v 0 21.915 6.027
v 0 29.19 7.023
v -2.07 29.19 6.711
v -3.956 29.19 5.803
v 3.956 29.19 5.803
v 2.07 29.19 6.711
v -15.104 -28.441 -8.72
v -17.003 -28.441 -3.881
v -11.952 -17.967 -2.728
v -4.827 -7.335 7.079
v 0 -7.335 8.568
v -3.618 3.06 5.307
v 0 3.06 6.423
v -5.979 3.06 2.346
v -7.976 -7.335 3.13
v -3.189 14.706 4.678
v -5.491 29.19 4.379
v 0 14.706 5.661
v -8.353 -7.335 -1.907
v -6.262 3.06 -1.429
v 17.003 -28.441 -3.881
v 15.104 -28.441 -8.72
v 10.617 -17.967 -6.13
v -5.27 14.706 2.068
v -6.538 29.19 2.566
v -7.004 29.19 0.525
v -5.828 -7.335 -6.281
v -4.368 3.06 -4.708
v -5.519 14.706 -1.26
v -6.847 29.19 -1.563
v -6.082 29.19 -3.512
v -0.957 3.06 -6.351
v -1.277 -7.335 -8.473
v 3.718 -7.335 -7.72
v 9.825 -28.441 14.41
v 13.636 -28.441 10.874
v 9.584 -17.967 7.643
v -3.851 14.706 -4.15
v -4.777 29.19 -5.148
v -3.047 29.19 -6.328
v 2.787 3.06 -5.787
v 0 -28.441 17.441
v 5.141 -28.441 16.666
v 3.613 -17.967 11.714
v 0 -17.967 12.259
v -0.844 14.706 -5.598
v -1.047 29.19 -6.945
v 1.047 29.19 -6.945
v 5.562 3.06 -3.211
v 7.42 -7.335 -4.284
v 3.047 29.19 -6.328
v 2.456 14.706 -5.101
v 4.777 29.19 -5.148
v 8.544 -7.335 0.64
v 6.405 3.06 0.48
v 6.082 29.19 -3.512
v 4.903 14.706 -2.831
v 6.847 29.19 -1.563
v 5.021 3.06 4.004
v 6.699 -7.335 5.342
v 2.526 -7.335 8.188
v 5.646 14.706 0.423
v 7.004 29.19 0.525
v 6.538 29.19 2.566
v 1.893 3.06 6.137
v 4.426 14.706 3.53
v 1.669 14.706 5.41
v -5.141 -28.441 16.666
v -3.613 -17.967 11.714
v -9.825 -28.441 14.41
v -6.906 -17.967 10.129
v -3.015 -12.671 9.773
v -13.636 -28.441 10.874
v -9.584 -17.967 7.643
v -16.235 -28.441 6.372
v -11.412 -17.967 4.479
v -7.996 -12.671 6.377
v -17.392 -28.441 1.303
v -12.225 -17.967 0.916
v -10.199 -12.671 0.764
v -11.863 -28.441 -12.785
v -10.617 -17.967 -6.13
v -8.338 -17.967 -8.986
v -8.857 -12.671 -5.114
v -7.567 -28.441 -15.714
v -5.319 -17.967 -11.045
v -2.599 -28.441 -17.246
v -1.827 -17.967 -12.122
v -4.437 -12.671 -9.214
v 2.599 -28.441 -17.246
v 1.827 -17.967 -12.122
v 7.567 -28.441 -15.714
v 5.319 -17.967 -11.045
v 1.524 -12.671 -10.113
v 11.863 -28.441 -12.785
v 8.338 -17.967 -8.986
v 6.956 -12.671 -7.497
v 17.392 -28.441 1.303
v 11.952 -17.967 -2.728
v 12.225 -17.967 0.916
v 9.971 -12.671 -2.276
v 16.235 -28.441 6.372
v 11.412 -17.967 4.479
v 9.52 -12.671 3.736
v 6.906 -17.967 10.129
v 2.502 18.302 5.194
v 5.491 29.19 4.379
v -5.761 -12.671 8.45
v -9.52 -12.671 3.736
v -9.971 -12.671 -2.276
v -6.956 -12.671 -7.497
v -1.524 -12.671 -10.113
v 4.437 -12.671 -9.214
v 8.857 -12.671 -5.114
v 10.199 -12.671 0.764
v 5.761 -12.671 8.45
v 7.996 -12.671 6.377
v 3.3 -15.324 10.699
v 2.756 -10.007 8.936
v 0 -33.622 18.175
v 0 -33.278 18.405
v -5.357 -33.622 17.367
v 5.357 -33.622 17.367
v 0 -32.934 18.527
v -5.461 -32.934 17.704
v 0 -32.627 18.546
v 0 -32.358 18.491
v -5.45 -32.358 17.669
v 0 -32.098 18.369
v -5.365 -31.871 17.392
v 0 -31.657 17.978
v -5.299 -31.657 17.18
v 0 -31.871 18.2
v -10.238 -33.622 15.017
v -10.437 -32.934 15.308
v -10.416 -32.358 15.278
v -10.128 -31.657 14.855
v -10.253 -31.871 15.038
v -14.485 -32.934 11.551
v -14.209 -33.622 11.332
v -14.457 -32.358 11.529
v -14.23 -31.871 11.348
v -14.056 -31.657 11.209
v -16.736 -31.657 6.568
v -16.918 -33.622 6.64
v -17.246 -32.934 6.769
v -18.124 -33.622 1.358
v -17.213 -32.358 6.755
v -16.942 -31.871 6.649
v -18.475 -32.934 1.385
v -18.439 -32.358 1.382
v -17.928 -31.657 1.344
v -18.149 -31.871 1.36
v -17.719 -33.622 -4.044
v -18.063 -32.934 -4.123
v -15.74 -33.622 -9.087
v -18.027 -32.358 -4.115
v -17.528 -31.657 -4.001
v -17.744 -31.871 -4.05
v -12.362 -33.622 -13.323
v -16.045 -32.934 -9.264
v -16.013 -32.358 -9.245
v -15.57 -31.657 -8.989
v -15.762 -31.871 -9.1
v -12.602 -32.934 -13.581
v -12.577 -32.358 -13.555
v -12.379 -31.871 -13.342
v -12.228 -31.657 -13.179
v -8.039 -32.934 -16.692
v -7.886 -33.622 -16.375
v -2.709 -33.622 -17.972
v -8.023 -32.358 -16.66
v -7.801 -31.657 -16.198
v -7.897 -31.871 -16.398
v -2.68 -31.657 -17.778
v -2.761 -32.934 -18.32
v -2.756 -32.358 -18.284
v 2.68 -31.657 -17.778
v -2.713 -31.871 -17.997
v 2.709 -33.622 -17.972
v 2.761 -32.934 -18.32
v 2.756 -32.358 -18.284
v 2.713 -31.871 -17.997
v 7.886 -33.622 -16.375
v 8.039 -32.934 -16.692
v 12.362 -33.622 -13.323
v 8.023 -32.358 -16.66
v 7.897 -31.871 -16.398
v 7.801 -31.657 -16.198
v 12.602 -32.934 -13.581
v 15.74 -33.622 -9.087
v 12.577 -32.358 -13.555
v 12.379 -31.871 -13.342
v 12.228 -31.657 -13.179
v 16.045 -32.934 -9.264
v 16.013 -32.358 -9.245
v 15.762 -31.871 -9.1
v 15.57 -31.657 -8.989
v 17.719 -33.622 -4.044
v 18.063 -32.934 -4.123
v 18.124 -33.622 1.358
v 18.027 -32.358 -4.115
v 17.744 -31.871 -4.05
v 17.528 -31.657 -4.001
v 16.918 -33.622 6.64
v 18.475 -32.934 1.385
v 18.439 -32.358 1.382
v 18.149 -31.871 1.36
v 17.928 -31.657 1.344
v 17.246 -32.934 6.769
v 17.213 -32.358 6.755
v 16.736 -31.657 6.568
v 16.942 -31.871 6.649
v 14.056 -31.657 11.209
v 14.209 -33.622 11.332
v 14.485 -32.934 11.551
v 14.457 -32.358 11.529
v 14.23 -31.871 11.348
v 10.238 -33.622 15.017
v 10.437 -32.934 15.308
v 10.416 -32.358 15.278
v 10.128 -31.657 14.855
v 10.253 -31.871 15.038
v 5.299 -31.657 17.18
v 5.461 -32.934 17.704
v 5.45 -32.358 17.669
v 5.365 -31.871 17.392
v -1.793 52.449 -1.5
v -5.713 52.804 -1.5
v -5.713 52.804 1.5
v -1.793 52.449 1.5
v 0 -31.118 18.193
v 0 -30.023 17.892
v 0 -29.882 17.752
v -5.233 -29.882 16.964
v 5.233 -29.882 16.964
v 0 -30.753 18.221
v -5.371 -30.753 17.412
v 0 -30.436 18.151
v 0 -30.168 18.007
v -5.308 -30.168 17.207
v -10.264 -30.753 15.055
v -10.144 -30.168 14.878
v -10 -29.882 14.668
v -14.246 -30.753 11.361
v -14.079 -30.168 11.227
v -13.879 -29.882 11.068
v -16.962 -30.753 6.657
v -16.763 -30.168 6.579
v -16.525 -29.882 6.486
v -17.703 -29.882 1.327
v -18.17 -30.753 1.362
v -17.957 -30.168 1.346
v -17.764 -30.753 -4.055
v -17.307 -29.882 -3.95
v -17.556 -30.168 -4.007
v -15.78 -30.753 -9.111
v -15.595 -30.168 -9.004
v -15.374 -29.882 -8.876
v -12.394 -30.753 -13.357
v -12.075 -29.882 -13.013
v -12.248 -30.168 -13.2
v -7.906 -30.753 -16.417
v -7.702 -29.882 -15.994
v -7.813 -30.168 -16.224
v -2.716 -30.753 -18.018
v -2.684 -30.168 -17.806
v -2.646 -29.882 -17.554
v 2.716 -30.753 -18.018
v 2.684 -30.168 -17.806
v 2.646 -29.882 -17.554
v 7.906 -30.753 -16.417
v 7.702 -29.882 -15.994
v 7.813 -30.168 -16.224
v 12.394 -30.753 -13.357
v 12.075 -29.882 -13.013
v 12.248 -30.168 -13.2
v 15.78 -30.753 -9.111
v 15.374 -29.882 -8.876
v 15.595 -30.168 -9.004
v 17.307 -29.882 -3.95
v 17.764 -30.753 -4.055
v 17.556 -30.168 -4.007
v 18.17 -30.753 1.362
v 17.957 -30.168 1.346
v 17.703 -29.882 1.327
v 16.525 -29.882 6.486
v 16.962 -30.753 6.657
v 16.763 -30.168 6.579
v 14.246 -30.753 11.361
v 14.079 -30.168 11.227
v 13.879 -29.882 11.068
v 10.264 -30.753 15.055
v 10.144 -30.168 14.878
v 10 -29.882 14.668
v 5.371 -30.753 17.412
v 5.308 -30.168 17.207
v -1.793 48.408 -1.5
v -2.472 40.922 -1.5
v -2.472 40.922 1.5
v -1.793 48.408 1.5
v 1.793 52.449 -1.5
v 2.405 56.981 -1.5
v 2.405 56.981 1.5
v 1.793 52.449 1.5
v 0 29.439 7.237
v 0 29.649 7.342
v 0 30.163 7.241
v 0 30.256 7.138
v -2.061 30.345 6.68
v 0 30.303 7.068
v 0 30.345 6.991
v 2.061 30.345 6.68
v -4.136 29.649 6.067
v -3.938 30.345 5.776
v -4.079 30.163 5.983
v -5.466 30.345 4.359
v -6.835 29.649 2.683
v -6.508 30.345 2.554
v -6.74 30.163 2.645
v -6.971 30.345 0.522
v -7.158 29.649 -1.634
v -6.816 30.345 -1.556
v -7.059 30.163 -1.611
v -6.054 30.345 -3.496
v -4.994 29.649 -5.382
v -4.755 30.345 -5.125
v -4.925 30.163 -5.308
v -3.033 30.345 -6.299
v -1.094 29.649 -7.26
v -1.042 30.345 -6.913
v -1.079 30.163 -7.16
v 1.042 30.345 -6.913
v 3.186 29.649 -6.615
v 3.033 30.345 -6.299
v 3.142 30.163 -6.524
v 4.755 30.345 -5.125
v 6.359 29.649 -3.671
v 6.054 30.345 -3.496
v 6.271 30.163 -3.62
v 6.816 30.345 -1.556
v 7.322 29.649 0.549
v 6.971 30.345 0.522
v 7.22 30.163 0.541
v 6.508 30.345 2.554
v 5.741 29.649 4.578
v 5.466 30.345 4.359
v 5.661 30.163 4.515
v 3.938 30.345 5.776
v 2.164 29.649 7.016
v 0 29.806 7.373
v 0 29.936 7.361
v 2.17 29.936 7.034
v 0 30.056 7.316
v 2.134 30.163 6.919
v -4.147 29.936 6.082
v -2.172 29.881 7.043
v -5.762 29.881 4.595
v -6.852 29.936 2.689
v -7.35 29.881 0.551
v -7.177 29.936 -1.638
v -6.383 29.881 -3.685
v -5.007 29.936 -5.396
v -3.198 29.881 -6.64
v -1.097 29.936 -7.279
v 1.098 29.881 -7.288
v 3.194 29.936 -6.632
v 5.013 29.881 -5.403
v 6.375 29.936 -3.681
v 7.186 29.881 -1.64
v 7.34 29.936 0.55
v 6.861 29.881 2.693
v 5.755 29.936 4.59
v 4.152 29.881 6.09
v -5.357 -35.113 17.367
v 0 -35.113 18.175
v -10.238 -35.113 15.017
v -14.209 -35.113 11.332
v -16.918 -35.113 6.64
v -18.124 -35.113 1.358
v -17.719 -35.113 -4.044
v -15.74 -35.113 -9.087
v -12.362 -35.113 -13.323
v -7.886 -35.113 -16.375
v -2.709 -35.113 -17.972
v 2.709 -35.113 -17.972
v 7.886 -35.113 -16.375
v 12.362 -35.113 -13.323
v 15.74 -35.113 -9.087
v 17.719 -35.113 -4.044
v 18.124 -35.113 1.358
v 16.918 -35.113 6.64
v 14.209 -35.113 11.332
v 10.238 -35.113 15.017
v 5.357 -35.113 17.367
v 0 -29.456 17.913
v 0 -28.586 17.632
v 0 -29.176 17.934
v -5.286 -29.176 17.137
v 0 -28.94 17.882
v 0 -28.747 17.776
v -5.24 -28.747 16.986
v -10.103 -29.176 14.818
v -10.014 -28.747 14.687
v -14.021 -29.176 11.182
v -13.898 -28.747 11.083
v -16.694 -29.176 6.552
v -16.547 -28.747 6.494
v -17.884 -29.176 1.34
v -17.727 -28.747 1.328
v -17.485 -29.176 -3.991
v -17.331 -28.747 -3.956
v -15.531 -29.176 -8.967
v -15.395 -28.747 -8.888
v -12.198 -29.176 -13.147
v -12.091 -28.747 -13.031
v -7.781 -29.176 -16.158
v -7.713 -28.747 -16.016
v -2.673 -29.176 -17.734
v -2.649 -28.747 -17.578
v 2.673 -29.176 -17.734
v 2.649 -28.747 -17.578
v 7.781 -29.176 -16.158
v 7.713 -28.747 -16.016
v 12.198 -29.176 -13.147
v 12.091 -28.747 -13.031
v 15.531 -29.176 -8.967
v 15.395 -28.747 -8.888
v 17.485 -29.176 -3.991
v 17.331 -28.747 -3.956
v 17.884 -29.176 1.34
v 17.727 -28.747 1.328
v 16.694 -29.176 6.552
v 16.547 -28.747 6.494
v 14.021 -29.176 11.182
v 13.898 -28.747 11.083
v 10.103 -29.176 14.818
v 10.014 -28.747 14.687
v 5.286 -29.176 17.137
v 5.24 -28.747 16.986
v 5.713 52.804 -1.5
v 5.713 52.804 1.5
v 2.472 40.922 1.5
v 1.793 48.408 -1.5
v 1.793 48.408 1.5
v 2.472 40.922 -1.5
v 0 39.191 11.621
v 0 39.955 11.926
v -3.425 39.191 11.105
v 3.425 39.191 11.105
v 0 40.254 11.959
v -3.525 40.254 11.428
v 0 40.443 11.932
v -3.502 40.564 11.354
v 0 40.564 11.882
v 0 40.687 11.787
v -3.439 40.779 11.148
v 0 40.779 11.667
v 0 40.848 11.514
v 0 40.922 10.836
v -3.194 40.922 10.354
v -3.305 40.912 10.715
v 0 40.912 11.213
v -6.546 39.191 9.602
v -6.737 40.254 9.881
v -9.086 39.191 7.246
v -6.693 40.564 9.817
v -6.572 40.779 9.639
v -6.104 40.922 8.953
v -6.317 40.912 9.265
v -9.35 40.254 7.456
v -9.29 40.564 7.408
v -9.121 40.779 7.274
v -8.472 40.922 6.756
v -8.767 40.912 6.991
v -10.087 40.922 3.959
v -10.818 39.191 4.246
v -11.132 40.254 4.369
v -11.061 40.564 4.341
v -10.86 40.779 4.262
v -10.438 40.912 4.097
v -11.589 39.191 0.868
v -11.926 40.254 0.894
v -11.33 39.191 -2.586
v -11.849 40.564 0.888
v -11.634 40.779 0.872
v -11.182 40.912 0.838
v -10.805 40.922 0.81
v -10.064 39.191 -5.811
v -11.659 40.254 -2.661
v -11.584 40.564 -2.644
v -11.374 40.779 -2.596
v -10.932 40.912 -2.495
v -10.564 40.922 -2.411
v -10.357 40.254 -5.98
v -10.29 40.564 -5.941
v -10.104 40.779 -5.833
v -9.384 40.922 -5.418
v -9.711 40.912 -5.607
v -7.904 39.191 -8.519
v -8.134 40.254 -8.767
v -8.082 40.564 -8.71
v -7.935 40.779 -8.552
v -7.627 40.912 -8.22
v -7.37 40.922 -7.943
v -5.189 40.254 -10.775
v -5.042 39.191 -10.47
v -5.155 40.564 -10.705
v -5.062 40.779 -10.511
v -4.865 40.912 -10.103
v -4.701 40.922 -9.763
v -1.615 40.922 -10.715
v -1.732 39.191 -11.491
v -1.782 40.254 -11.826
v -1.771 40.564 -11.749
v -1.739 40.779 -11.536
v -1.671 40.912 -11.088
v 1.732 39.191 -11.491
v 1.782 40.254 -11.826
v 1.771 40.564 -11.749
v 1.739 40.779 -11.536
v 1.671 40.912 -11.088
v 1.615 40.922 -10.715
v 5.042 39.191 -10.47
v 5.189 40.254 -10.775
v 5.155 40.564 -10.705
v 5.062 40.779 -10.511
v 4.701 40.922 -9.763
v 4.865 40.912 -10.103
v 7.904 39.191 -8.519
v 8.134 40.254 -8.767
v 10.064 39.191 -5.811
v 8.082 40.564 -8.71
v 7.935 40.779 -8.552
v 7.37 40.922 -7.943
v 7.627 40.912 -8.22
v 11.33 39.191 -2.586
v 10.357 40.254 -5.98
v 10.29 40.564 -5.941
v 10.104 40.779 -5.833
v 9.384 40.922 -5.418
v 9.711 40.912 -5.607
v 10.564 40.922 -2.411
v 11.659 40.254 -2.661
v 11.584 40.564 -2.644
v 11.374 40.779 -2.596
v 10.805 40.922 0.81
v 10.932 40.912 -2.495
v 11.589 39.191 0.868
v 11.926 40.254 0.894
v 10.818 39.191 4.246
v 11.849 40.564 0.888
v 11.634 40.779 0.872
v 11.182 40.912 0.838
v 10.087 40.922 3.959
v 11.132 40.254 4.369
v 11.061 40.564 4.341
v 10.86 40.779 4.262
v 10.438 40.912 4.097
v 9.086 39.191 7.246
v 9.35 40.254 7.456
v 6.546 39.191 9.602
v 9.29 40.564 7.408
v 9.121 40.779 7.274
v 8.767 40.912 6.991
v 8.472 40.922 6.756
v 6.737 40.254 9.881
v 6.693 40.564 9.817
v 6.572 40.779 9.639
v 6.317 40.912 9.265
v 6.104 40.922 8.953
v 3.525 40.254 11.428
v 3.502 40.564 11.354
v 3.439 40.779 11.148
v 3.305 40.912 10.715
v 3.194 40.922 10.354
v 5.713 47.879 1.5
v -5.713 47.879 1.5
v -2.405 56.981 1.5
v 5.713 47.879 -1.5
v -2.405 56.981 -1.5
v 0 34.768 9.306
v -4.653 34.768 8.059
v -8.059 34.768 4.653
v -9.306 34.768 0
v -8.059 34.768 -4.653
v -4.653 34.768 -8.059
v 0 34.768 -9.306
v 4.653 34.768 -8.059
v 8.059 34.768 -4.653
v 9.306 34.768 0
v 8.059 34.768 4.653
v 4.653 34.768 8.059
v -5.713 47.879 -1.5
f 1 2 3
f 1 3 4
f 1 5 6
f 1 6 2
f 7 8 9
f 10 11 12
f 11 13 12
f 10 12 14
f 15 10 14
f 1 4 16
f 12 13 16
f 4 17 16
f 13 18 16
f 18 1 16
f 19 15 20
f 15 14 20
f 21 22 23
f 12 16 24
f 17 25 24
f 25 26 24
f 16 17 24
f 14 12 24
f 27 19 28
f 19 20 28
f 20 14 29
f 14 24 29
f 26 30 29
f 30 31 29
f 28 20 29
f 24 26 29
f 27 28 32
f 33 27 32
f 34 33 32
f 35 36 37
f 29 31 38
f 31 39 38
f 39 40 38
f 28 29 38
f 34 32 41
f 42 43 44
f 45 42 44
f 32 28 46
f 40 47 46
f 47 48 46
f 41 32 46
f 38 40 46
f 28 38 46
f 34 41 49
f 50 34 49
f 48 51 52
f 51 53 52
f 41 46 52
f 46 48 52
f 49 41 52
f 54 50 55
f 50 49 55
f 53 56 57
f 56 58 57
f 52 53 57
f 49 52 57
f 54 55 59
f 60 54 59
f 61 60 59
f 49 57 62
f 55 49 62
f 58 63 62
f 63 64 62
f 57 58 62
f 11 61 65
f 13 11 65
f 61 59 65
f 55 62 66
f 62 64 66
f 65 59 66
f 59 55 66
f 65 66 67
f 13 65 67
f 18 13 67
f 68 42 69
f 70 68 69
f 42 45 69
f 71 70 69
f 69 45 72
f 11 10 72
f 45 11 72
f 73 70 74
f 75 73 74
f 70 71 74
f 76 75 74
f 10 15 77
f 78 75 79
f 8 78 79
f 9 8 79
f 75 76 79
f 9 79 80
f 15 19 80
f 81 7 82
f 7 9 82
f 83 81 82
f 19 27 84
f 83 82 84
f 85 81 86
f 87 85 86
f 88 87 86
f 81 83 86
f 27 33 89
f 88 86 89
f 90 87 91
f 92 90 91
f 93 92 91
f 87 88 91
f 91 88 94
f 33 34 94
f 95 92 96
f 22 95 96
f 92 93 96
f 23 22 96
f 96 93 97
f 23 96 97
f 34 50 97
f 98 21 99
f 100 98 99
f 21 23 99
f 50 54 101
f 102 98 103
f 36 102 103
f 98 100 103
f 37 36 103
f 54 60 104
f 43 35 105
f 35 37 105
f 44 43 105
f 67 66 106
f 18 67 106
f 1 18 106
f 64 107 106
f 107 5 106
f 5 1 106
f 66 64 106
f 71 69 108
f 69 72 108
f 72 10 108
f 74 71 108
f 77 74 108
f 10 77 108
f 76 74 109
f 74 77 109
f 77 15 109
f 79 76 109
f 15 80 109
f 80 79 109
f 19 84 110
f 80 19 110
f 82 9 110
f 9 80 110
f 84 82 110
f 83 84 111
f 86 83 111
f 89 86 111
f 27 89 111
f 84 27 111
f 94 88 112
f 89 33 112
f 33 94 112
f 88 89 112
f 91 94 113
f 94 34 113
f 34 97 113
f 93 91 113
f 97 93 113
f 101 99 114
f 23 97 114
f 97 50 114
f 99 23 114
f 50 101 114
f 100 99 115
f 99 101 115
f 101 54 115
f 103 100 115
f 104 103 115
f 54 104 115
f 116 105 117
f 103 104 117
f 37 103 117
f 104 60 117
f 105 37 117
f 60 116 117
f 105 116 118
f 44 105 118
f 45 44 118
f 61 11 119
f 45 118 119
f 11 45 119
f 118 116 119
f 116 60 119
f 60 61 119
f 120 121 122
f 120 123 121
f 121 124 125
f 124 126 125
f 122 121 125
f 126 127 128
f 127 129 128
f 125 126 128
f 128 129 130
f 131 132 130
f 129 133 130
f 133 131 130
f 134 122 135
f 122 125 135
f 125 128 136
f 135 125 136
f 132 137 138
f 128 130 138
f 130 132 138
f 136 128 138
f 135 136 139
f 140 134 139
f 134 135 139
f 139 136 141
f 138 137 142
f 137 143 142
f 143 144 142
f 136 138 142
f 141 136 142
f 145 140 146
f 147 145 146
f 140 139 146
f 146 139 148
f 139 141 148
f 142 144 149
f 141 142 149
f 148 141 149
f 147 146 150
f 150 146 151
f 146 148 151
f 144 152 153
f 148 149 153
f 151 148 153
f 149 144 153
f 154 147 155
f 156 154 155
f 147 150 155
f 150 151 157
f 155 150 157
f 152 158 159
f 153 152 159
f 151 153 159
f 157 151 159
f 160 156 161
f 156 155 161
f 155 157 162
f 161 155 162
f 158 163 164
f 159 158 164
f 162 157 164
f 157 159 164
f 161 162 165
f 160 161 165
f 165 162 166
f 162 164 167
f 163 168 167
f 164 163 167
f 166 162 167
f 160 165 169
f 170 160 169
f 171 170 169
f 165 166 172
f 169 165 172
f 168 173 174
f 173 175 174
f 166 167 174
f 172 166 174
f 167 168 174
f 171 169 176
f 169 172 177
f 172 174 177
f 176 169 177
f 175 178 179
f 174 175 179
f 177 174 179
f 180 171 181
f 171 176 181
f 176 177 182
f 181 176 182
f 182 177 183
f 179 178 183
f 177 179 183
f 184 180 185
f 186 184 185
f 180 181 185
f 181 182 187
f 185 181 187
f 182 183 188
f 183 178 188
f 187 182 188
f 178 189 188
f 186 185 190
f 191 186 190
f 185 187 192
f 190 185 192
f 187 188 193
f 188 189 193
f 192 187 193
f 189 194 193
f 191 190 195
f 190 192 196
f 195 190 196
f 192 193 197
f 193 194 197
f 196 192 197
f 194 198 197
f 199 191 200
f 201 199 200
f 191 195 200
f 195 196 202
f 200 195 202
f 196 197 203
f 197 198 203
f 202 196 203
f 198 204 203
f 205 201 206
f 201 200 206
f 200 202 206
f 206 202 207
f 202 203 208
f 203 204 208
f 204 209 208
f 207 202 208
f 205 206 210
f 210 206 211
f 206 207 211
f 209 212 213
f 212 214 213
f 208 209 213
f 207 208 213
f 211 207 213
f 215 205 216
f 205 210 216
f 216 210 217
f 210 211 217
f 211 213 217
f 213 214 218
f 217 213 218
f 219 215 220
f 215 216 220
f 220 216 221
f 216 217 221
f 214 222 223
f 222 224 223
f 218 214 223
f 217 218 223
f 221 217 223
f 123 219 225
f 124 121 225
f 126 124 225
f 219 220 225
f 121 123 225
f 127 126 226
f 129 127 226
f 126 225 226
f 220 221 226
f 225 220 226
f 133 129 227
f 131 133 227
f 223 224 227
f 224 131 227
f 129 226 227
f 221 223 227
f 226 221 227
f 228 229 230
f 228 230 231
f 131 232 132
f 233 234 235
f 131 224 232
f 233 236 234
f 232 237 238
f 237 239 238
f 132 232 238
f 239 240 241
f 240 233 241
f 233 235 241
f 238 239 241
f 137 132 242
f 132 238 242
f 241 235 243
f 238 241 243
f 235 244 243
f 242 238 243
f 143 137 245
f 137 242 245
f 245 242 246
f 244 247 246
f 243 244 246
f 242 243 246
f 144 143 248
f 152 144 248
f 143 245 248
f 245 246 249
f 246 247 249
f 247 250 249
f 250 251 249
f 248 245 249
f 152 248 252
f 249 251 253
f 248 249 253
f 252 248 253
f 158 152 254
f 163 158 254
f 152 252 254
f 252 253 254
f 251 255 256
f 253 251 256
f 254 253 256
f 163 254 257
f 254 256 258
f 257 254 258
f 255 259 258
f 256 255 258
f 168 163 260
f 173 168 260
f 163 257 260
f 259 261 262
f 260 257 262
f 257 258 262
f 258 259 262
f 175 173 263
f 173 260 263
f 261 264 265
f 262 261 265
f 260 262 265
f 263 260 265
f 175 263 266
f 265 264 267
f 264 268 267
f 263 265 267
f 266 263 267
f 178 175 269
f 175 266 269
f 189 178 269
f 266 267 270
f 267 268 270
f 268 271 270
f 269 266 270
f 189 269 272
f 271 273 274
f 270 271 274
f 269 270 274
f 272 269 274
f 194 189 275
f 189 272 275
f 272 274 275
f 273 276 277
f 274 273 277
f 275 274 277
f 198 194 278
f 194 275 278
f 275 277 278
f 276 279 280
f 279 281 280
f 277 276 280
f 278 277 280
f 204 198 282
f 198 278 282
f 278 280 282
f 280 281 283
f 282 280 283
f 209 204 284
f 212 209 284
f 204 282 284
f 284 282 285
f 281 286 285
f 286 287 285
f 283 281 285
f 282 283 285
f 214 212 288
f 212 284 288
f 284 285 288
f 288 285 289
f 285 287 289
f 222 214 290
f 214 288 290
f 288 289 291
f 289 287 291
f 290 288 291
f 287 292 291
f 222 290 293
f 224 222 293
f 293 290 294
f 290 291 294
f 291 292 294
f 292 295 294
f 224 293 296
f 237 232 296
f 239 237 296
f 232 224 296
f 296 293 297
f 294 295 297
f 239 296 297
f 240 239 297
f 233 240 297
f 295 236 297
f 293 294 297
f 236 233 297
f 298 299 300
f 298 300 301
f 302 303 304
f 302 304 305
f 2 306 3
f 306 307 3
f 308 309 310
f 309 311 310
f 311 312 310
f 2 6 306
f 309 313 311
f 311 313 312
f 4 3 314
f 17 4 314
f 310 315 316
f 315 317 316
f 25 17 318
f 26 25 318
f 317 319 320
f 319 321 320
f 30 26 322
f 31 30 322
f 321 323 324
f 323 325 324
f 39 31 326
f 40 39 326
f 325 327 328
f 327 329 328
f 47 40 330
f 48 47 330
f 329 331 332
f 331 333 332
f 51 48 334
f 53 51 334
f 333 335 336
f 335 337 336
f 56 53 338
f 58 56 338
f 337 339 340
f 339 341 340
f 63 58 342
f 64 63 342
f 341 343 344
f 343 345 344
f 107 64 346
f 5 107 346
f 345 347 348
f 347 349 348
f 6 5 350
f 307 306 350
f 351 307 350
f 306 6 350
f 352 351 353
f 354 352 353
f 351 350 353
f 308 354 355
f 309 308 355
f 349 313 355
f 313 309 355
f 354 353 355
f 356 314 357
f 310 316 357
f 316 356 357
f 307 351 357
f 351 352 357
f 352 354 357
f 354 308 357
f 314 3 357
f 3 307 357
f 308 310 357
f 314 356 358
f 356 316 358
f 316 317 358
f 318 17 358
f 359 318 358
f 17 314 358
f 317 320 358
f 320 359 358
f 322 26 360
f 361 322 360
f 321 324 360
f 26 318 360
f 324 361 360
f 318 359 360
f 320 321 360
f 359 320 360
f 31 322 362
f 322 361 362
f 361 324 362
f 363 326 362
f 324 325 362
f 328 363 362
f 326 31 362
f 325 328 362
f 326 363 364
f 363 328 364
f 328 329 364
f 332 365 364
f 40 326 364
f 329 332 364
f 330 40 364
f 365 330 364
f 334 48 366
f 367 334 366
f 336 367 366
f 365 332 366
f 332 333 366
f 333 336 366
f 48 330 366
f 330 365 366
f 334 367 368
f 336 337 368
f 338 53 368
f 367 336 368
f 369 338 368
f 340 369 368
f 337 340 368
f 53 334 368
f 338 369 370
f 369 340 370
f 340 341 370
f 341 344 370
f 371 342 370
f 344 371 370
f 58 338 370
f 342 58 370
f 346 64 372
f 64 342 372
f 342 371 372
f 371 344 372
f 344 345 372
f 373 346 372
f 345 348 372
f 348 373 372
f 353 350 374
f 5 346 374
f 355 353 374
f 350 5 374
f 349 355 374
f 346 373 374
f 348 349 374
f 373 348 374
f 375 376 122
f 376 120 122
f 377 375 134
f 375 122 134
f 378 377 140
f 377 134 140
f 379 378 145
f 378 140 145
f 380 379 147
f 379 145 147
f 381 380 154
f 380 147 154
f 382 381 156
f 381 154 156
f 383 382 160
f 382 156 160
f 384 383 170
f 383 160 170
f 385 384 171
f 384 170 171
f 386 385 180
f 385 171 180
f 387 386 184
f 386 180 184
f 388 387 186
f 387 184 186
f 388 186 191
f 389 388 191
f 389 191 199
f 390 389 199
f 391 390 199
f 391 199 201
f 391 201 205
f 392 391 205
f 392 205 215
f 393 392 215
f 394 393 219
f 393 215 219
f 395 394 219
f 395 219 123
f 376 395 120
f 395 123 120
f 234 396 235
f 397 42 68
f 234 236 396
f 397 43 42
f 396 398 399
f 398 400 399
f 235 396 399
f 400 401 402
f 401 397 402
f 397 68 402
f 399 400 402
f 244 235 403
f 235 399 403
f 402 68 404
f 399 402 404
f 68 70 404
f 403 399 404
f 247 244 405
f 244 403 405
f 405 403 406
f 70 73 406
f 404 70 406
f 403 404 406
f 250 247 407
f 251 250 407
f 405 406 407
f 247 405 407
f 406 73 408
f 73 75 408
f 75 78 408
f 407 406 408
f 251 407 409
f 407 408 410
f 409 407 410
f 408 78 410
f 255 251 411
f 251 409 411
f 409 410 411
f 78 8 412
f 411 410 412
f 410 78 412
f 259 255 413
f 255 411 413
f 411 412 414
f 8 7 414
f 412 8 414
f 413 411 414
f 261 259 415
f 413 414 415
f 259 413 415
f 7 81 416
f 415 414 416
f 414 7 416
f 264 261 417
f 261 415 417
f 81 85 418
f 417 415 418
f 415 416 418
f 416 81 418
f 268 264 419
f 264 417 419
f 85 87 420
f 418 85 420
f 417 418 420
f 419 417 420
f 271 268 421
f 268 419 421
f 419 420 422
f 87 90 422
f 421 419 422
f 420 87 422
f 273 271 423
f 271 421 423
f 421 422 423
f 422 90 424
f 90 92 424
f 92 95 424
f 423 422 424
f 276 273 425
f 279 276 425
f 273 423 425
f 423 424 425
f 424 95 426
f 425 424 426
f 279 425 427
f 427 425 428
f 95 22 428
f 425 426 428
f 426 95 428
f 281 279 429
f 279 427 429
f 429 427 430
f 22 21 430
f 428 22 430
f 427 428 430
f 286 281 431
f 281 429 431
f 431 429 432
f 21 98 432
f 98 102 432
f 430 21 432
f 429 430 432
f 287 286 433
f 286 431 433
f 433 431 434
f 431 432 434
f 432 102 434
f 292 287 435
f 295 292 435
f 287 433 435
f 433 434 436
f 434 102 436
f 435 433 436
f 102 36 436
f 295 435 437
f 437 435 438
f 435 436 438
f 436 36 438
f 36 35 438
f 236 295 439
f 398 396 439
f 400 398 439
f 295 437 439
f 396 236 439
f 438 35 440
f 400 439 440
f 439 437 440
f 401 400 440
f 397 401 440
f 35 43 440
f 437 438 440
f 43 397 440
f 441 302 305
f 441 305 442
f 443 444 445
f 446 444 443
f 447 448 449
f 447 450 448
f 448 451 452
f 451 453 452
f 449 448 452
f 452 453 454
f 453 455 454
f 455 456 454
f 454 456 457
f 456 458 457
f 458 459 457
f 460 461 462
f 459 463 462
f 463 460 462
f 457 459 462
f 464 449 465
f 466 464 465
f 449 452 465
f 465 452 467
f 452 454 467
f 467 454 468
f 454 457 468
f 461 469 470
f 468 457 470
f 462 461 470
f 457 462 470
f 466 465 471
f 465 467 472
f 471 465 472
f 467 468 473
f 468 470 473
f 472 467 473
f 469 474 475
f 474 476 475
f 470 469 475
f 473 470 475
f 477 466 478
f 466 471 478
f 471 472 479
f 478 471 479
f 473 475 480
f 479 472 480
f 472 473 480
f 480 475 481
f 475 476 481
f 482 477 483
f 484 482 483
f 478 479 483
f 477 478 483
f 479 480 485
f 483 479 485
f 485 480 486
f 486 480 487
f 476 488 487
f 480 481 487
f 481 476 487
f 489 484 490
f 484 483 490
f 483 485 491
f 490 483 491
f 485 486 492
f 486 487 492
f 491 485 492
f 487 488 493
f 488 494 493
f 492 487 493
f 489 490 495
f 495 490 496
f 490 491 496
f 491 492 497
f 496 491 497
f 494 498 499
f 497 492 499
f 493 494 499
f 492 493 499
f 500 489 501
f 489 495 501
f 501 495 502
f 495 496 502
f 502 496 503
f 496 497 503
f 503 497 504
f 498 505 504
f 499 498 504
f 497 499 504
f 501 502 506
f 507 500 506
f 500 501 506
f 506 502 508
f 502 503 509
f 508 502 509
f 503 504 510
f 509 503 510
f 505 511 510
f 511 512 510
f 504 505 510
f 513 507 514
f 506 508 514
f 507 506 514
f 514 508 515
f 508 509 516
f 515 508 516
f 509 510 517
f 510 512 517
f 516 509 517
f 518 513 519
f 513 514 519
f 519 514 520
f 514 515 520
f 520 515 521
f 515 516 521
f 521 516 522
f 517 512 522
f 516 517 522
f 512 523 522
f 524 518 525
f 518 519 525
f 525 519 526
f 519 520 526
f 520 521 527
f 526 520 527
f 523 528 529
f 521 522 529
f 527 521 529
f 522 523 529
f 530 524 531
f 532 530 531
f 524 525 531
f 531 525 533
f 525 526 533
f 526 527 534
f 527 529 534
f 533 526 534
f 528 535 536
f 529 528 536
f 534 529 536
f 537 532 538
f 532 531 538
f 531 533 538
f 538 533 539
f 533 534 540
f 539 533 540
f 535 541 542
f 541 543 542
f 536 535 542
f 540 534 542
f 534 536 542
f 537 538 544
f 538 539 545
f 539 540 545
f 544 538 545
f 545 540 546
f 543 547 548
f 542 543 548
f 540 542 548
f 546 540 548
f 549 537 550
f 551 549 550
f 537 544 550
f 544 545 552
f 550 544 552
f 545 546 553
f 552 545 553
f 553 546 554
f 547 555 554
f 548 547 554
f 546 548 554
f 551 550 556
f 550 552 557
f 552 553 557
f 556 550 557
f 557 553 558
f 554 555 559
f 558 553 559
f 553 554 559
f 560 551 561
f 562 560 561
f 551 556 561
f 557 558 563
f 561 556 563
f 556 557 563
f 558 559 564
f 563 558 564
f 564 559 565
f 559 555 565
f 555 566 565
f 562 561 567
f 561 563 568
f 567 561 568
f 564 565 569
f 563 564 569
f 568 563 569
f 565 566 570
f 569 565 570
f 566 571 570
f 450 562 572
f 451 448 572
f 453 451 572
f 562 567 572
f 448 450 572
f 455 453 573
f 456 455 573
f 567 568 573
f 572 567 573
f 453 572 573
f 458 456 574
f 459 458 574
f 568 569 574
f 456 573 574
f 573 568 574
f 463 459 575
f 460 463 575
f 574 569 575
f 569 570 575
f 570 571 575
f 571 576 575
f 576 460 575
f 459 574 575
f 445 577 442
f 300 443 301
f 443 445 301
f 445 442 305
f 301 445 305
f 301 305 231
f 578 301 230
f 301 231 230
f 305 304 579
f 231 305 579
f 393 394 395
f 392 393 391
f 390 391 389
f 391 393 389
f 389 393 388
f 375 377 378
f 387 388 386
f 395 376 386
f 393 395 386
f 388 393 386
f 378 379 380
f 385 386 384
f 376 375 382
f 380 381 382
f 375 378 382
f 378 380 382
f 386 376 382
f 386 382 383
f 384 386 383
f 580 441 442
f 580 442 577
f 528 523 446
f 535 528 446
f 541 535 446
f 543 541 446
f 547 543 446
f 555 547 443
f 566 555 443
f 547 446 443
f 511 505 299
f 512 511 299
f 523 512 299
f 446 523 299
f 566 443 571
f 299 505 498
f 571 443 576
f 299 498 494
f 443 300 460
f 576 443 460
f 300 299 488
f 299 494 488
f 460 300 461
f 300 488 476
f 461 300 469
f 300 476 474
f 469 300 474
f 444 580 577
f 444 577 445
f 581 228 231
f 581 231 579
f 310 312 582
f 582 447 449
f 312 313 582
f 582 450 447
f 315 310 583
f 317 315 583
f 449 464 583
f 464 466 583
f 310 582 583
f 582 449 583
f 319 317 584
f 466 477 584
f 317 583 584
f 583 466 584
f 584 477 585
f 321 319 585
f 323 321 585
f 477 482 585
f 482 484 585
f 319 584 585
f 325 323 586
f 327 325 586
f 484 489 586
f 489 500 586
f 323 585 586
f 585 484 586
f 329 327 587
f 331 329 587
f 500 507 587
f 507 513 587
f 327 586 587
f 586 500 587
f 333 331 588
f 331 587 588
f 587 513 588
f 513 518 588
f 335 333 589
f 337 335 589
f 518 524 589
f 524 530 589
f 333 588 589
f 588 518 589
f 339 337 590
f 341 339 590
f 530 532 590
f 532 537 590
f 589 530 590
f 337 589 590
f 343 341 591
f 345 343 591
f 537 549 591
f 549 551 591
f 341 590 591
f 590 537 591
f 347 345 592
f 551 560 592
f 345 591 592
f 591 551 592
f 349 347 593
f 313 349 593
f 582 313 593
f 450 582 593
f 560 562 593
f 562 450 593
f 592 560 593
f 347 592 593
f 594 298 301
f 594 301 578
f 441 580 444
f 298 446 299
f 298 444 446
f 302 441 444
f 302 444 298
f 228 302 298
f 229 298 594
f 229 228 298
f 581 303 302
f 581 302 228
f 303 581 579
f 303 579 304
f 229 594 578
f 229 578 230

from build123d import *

# Parameters (mm, degrees)
BOSS_EXTRUDE1_DEPTH      = 1.5
BOSS_EXTRUDE1_DEPTH_BACK = 1.5


with BuildPart() as part:
    # Body → Revolve2 (revolve)
    with BuildSketch(Plane.XY):
        with BuildLine():
            Line((0, -35.112605452), (-18.174629027, -35.112605452))
            Line((-18.174629027, -35.112605452), (-18.174629027, -33.622393907))
            add(Edge.make_bspline(
                [(-18.174629027, -33.622393907), (-18.746777836, -32.93871692), (-18.649381124, -32.21761099), (-17.978486488, -31.656539775)],
                knots=[0, 0, 0, 0, 1, 1, 1, 1], degree=3))
            add(Edge.make_bspline(
                [(-17.978486488, -31.656539775), (-18.565257788, -30.617916679), (-17.752329486, -29.882490381)],
                knots=[0, 0, 0, 1, 1, 1], degree=2))
            add(Edge.make_bspline(
                [(-17.752329486, -29.882490381), (-18.238397249, -28.955270963), (-17.440670859, -28.44106923)],
                knots=[0, 0, 0, 1, 1, 1], degree=2))
            add(Edge.make_bspline(
                [(-17.440670859, -28.44106923), (-1.650744274, -0.748893793), (-7.023375291, 29.189979279)],
                knots=[0, 0, 0, 1, 1, 1], degree=2))
            add(Edge.make_bspline(
                [(-7.023375291, 29.189979279), (-7.559938915, 29.704191997), (-7.422823029, 30.133693737), (-6.991039479, 30.344569347)],
                knots=[0, 0, 0, 0, 1, 1, 1, 1], degree=3))
            Line((-6.991039479, 30.344569347), (-11.621054148, 39.190746791))
            add(Edge.make_bspline(
                [(-11.621054148, 39.190746791), (-12.576182421, 40.990355328), (-10.835631062, 40.921958778)],
                knots=[0, 0, 0, 1, 1, 1], degree=2))
            Line((-10.835631062, 40.921958778), (0, 40.921958778))
            Line((0, 40.921958778), (0, -35.112605452))
        make_face()
    revolve(axis=Axis((0, 55.231222452, 0), (0, -1, 0)))

    # Head → Boss-Extrude1 (add, two sides: drawn at the far end of the back side and taken through both)
    with BuildSketch(Plane.XY.offset(-BOSS_EXTRUDE1_DEPTH_BACK)):
        Polygon((2.472072564, 40.921958778), (-2.472072564, 40.921958778), (-1.793454985, 48.407527059), (-5.713262358, 47.878921151), (-5.713262358, 52.804097239), (-1.793454985, 52.448740091), (-2.404603177, 56.980628878), (2.404603177, 56.980628878), (1.793454985, 52.448740091), (5.713262358, 52.804097239), (5.713262358, 47.878921151), (1.793454985, 48.407527059), align=None)
    extrude(amount=BOSS_EXTRUDE1_DEPTH + BOSS_EXTRUDE1_DEPTH_BACK)


solid = part.part
